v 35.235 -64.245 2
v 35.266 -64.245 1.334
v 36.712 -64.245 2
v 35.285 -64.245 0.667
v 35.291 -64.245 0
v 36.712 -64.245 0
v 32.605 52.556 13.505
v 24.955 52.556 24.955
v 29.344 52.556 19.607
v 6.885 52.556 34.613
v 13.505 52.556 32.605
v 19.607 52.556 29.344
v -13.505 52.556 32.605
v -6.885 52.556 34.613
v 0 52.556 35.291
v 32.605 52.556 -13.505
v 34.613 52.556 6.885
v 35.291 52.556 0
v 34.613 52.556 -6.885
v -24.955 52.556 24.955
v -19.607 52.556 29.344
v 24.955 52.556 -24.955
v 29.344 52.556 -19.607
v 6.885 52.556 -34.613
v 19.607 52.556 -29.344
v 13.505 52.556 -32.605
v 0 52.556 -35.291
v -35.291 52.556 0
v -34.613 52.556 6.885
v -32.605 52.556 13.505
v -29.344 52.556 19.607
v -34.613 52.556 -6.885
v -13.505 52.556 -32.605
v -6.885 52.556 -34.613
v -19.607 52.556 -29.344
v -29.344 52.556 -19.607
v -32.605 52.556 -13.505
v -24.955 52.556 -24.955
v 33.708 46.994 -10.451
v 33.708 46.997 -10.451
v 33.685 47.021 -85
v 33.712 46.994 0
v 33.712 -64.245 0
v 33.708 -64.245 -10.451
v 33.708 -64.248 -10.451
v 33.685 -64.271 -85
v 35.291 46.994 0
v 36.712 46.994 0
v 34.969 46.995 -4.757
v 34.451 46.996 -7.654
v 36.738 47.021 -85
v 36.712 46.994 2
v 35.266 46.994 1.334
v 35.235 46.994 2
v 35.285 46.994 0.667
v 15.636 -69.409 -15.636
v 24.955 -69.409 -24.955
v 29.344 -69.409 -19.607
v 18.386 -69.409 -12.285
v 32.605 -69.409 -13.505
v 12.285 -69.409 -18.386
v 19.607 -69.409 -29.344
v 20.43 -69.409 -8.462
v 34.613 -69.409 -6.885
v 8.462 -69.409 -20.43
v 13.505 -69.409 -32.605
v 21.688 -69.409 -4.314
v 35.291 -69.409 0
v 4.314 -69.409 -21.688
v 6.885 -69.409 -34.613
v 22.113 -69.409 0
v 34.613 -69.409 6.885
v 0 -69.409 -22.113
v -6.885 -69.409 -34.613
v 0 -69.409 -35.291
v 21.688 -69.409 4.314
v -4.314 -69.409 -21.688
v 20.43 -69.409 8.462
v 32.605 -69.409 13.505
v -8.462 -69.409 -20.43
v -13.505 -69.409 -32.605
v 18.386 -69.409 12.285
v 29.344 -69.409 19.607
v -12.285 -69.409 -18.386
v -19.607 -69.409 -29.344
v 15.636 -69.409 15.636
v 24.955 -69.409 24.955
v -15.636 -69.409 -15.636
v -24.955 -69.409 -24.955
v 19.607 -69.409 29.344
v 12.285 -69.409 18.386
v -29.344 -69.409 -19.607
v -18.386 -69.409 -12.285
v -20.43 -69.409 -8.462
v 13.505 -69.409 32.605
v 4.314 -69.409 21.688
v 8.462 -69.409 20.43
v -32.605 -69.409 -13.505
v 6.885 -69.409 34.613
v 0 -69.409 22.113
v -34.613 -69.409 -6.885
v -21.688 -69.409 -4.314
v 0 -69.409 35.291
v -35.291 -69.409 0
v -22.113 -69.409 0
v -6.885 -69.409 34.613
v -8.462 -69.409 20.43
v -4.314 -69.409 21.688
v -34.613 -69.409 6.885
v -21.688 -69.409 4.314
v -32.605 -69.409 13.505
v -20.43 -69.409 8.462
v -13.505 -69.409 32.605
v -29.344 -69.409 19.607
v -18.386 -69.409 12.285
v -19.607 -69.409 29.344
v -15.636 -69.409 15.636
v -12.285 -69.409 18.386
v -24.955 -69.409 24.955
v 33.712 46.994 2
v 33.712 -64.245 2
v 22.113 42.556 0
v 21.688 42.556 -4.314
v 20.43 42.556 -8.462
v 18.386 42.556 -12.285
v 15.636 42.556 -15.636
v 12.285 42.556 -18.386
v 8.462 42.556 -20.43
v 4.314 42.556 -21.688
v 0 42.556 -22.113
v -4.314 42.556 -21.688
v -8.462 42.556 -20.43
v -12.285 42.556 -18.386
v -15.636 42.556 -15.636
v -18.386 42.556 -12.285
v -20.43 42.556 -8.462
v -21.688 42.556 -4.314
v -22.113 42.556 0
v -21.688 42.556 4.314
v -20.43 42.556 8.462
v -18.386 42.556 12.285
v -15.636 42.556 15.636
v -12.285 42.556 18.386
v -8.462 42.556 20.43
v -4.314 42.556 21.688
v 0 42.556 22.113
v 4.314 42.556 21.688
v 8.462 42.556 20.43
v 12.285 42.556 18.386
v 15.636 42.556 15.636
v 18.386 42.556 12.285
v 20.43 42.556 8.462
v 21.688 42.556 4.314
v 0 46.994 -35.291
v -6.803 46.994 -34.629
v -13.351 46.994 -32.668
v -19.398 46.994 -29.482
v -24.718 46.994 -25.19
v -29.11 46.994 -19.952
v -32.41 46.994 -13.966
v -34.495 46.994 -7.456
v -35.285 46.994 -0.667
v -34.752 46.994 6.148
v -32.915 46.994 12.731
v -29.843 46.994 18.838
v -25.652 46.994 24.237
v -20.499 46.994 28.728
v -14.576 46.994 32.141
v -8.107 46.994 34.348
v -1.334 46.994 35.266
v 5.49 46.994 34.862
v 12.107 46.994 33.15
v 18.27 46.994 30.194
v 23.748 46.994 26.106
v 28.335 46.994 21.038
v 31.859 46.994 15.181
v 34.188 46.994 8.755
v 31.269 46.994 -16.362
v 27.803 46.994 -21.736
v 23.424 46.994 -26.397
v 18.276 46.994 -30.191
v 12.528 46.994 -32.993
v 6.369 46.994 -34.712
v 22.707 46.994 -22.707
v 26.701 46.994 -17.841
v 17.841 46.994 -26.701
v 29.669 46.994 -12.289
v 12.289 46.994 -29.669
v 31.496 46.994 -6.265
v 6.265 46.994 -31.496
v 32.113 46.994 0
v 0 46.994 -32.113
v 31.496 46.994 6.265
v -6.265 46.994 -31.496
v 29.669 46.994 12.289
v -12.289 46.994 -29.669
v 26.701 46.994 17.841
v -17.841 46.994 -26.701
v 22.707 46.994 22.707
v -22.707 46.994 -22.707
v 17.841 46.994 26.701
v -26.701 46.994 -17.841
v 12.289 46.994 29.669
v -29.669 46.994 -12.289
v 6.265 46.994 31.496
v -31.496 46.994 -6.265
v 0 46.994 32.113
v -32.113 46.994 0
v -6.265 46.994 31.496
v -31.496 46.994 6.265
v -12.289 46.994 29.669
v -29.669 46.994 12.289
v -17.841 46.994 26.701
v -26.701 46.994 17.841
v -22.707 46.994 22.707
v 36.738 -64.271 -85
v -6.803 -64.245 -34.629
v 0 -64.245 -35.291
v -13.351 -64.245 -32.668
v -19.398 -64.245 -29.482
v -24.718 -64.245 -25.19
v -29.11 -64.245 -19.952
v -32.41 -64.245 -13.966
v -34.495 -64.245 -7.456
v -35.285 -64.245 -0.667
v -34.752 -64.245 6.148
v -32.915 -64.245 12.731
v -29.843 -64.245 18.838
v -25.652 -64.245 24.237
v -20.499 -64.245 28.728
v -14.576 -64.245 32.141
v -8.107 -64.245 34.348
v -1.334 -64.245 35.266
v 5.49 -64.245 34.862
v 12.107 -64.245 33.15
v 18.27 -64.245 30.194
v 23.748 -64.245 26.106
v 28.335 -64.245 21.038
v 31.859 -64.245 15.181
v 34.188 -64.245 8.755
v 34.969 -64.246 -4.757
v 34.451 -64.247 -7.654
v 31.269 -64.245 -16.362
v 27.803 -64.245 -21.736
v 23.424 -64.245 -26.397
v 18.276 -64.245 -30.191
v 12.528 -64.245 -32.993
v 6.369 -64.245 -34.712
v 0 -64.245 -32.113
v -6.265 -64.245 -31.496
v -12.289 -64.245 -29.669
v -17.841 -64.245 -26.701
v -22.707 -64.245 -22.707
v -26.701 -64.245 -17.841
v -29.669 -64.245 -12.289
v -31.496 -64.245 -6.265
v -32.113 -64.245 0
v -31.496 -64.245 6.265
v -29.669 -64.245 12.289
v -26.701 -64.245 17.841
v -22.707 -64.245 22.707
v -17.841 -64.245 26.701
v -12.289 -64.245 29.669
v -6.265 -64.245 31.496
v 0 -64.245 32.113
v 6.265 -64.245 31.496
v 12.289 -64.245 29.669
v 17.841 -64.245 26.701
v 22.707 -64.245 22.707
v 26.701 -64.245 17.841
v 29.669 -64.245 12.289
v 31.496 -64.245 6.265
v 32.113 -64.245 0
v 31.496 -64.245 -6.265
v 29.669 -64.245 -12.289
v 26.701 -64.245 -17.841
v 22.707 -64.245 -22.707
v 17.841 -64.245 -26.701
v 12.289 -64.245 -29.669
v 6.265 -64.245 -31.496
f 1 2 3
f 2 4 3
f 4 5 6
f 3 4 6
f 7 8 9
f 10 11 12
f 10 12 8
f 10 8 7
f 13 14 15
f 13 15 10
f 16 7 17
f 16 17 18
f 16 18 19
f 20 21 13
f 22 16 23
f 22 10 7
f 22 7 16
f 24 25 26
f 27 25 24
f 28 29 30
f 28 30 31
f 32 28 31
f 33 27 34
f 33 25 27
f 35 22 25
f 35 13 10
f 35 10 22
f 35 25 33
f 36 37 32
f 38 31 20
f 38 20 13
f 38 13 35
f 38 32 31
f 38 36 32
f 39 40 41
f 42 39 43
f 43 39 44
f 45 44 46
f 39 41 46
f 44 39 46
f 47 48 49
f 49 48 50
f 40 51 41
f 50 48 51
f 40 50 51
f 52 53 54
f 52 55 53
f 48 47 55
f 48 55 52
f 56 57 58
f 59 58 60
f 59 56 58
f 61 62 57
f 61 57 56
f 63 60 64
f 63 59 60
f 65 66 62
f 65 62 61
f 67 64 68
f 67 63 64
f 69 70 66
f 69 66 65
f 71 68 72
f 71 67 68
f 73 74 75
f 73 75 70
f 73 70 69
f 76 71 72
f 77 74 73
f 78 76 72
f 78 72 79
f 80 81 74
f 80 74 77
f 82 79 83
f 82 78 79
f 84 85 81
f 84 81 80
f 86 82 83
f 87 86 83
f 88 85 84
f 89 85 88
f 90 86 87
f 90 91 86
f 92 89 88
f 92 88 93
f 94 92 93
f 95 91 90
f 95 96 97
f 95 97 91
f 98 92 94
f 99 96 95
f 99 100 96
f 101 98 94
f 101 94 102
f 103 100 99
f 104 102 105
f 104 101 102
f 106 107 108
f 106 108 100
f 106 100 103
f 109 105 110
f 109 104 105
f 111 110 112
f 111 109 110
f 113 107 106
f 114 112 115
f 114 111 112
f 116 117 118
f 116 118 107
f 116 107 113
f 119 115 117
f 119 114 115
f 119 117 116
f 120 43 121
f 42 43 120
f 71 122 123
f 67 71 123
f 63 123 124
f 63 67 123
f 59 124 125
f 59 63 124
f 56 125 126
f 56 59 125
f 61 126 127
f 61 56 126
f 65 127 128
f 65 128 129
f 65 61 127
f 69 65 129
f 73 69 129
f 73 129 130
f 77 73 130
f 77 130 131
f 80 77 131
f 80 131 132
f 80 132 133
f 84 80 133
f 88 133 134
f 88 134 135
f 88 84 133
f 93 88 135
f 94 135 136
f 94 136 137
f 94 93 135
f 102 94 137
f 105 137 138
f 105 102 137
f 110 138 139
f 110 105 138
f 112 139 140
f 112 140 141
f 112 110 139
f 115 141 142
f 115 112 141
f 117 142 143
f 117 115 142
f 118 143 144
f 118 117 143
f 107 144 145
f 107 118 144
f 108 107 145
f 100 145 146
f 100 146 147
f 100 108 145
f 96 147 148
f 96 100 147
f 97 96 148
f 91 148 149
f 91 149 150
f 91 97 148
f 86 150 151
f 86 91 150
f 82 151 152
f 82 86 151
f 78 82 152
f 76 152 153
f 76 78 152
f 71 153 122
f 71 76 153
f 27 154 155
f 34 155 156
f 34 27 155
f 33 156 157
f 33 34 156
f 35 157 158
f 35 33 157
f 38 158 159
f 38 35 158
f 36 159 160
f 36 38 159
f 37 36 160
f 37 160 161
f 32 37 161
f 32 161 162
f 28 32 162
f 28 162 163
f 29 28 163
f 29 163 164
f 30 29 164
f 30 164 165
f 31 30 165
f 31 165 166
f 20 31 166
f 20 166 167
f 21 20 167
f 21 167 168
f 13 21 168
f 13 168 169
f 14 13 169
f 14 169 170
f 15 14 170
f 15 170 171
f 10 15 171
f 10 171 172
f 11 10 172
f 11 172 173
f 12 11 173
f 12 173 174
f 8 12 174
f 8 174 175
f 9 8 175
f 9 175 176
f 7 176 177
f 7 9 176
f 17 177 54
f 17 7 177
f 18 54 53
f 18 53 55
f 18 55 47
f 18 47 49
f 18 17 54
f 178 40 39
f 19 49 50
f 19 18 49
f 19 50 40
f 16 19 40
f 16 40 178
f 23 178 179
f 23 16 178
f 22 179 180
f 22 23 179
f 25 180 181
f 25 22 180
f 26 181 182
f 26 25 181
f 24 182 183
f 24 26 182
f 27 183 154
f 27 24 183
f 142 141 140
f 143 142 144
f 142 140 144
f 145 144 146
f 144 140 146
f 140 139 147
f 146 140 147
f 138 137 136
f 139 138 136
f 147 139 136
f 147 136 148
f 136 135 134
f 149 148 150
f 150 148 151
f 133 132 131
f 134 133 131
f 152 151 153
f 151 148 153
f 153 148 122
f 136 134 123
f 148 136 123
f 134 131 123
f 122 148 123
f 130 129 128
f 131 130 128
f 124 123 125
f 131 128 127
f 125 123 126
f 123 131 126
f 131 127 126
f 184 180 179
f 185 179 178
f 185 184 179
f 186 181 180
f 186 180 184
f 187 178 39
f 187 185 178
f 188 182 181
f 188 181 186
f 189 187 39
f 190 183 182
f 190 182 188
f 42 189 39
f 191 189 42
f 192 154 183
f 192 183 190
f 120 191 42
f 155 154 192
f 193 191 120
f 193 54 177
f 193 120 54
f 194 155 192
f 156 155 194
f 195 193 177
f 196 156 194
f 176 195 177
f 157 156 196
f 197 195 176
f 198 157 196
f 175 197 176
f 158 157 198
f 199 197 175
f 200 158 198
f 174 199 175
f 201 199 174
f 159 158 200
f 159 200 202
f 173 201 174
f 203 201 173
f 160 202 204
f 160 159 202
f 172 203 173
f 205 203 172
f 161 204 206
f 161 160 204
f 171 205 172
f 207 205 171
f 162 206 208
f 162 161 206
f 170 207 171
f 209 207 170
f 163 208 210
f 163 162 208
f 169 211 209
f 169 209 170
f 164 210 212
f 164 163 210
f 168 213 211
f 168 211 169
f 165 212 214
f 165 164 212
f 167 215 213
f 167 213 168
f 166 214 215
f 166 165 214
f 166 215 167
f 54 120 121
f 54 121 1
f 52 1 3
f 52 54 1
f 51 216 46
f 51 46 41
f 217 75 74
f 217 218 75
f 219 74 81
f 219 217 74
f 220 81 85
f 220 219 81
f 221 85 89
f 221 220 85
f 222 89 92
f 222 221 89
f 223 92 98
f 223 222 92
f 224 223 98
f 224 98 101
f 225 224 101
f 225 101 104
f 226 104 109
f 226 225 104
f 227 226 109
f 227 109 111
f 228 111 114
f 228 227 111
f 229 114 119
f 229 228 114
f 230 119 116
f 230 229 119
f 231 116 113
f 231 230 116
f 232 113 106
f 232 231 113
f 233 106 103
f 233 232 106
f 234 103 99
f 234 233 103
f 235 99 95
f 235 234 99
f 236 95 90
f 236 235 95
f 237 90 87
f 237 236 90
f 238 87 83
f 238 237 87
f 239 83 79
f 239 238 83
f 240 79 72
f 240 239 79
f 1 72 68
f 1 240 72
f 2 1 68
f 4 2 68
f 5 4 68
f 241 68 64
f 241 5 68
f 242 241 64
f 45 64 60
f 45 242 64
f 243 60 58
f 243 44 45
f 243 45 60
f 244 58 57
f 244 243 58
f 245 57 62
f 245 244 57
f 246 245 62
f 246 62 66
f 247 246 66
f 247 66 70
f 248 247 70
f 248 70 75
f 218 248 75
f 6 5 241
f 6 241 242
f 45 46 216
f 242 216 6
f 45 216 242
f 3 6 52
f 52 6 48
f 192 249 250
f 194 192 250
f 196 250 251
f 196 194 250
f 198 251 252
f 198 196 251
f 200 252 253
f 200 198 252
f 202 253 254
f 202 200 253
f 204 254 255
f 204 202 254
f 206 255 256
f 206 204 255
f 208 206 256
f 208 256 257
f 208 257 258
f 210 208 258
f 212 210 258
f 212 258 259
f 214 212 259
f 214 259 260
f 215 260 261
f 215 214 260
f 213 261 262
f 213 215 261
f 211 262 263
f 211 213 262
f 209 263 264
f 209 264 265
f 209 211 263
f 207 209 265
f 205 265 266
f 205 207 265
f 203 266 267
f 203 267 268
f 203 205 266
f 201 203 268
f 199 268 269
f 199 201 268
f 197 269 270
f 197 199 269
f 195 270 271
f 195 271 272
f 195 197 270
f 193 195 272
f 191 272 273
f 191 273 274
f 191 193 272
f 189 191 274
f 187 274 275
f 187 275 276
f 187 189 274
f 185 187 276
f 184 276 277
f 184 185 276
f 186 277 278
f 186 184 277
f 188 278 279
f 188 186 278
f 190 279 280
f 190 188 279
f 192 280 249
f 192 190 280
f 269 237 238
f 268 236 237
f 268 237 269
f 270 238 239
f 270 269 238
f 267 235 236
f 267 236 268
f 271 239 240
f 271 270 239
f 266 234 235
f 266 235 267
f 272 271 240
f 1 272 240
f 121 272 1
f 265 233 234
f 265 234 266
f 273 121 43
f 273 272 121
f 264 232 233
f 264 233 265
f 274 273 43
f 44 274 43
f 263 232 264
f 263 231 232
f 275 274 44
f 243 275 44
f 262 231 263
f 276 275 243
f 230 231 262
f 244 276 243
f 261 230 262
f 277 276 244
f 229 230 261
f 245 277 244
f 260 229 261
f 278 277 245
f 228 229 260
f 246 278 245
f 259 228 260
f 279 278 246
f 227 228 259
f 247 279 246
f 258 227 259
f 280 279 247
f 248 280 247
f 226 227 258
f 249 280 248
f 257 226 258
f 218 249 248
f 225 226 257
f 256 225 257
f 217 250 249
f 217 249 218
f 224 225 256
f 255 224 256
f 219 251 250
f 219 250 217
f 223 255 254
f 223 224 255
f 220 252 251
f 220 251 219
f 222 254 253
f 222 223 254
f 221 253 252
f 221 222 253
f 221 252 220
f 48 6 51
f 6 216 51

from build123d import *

# Parameters (mm, degrees)
VACIADO1_START                    = -69.409306307
VACIADO1_OUTLINE_R                = 22.113173388
VACIADO1_DEPTH                    = 111.965075994
CROQUIS3_W                        = 3
CROQUIS3_H                        = 111.238505794
SALIENTE_EXTRUIR1_DEPTH           = 85
SALIENTE_EXTRUIR1_TAPER           = -0.018
SALIENTE_EXTRUIR1_OTHER_WAY_DEPTH = 2


# Read off the part's stored shape, not the designer's step: Vaciado1
with BuildPart() as part:
    # Croquis1 → Revolución1 (revolve)
    with BuildSketch(Plane.XY, mode=Mode.PRIVATE) as revoluci_n1_sk:
        Polygon((0, 52.555769687), (0, 46.993844398), (0, -69.409306307), (35.29141641, -69.409306307), (35.29141641, -64.244661396), (32.113173388, -64.244661396), (32.113173388, 46.993844398), (35.29141641, 46.993844398), (35.29141641, 52.555769687), align=None)
    revolve(revoluci_n1_sk.sketch.rotate(Axis((0, -77.4814163, 0), (0, 1, 0)), 90), axis=Axis((0, -77.4814163, 0), (0, 1, 0)))

    # Vaciado1 outline → Vaciado1 (cut)
    with BuildSketch(Plane(origin=(0, 0, 0), x_dir=(1, 0, 0), z_dir=(0, 1, 0)).offset(VACIADO1_START)):
        Circle(VACIADO1_OUTLINE_R)
    extrude(amount=VACIADO1_DEPTH, mode=Mode.SUBTRACT)

    # Croquis3 → Saliente-Extruir1 (add)
    with BuildSketch(Plane(origin=(35.21176327, 0, 0), x_dir=(1, 0, 0), z_dir=(0, 0, 1))):
        with Locations((0, -8.625408499)):
            Rectangle(CROQUIS3_W, CROQUIS3_H)
    extrude(amount=-SALIENTE_EXTRUIR1_DEPTH, taper=SALIENTE_EXTRUIR1_TAPER)

    # Croquis3 → Saliente-Extruir1 other way (add)
    with BuildSketch(Plane(origin=(35.21176327, 0, 0), x_dir=(1, 0, 0), z_dir=(0, 0, 1))):
        with Locations((0, -8.625408499)):
            Rectangle(CROQUIS3_W, CROQUIS3_H)
    extrude(amount=SALIENTE_EXTRUIR1_OTHER_WAY_DEPTH)


solid = part.part
